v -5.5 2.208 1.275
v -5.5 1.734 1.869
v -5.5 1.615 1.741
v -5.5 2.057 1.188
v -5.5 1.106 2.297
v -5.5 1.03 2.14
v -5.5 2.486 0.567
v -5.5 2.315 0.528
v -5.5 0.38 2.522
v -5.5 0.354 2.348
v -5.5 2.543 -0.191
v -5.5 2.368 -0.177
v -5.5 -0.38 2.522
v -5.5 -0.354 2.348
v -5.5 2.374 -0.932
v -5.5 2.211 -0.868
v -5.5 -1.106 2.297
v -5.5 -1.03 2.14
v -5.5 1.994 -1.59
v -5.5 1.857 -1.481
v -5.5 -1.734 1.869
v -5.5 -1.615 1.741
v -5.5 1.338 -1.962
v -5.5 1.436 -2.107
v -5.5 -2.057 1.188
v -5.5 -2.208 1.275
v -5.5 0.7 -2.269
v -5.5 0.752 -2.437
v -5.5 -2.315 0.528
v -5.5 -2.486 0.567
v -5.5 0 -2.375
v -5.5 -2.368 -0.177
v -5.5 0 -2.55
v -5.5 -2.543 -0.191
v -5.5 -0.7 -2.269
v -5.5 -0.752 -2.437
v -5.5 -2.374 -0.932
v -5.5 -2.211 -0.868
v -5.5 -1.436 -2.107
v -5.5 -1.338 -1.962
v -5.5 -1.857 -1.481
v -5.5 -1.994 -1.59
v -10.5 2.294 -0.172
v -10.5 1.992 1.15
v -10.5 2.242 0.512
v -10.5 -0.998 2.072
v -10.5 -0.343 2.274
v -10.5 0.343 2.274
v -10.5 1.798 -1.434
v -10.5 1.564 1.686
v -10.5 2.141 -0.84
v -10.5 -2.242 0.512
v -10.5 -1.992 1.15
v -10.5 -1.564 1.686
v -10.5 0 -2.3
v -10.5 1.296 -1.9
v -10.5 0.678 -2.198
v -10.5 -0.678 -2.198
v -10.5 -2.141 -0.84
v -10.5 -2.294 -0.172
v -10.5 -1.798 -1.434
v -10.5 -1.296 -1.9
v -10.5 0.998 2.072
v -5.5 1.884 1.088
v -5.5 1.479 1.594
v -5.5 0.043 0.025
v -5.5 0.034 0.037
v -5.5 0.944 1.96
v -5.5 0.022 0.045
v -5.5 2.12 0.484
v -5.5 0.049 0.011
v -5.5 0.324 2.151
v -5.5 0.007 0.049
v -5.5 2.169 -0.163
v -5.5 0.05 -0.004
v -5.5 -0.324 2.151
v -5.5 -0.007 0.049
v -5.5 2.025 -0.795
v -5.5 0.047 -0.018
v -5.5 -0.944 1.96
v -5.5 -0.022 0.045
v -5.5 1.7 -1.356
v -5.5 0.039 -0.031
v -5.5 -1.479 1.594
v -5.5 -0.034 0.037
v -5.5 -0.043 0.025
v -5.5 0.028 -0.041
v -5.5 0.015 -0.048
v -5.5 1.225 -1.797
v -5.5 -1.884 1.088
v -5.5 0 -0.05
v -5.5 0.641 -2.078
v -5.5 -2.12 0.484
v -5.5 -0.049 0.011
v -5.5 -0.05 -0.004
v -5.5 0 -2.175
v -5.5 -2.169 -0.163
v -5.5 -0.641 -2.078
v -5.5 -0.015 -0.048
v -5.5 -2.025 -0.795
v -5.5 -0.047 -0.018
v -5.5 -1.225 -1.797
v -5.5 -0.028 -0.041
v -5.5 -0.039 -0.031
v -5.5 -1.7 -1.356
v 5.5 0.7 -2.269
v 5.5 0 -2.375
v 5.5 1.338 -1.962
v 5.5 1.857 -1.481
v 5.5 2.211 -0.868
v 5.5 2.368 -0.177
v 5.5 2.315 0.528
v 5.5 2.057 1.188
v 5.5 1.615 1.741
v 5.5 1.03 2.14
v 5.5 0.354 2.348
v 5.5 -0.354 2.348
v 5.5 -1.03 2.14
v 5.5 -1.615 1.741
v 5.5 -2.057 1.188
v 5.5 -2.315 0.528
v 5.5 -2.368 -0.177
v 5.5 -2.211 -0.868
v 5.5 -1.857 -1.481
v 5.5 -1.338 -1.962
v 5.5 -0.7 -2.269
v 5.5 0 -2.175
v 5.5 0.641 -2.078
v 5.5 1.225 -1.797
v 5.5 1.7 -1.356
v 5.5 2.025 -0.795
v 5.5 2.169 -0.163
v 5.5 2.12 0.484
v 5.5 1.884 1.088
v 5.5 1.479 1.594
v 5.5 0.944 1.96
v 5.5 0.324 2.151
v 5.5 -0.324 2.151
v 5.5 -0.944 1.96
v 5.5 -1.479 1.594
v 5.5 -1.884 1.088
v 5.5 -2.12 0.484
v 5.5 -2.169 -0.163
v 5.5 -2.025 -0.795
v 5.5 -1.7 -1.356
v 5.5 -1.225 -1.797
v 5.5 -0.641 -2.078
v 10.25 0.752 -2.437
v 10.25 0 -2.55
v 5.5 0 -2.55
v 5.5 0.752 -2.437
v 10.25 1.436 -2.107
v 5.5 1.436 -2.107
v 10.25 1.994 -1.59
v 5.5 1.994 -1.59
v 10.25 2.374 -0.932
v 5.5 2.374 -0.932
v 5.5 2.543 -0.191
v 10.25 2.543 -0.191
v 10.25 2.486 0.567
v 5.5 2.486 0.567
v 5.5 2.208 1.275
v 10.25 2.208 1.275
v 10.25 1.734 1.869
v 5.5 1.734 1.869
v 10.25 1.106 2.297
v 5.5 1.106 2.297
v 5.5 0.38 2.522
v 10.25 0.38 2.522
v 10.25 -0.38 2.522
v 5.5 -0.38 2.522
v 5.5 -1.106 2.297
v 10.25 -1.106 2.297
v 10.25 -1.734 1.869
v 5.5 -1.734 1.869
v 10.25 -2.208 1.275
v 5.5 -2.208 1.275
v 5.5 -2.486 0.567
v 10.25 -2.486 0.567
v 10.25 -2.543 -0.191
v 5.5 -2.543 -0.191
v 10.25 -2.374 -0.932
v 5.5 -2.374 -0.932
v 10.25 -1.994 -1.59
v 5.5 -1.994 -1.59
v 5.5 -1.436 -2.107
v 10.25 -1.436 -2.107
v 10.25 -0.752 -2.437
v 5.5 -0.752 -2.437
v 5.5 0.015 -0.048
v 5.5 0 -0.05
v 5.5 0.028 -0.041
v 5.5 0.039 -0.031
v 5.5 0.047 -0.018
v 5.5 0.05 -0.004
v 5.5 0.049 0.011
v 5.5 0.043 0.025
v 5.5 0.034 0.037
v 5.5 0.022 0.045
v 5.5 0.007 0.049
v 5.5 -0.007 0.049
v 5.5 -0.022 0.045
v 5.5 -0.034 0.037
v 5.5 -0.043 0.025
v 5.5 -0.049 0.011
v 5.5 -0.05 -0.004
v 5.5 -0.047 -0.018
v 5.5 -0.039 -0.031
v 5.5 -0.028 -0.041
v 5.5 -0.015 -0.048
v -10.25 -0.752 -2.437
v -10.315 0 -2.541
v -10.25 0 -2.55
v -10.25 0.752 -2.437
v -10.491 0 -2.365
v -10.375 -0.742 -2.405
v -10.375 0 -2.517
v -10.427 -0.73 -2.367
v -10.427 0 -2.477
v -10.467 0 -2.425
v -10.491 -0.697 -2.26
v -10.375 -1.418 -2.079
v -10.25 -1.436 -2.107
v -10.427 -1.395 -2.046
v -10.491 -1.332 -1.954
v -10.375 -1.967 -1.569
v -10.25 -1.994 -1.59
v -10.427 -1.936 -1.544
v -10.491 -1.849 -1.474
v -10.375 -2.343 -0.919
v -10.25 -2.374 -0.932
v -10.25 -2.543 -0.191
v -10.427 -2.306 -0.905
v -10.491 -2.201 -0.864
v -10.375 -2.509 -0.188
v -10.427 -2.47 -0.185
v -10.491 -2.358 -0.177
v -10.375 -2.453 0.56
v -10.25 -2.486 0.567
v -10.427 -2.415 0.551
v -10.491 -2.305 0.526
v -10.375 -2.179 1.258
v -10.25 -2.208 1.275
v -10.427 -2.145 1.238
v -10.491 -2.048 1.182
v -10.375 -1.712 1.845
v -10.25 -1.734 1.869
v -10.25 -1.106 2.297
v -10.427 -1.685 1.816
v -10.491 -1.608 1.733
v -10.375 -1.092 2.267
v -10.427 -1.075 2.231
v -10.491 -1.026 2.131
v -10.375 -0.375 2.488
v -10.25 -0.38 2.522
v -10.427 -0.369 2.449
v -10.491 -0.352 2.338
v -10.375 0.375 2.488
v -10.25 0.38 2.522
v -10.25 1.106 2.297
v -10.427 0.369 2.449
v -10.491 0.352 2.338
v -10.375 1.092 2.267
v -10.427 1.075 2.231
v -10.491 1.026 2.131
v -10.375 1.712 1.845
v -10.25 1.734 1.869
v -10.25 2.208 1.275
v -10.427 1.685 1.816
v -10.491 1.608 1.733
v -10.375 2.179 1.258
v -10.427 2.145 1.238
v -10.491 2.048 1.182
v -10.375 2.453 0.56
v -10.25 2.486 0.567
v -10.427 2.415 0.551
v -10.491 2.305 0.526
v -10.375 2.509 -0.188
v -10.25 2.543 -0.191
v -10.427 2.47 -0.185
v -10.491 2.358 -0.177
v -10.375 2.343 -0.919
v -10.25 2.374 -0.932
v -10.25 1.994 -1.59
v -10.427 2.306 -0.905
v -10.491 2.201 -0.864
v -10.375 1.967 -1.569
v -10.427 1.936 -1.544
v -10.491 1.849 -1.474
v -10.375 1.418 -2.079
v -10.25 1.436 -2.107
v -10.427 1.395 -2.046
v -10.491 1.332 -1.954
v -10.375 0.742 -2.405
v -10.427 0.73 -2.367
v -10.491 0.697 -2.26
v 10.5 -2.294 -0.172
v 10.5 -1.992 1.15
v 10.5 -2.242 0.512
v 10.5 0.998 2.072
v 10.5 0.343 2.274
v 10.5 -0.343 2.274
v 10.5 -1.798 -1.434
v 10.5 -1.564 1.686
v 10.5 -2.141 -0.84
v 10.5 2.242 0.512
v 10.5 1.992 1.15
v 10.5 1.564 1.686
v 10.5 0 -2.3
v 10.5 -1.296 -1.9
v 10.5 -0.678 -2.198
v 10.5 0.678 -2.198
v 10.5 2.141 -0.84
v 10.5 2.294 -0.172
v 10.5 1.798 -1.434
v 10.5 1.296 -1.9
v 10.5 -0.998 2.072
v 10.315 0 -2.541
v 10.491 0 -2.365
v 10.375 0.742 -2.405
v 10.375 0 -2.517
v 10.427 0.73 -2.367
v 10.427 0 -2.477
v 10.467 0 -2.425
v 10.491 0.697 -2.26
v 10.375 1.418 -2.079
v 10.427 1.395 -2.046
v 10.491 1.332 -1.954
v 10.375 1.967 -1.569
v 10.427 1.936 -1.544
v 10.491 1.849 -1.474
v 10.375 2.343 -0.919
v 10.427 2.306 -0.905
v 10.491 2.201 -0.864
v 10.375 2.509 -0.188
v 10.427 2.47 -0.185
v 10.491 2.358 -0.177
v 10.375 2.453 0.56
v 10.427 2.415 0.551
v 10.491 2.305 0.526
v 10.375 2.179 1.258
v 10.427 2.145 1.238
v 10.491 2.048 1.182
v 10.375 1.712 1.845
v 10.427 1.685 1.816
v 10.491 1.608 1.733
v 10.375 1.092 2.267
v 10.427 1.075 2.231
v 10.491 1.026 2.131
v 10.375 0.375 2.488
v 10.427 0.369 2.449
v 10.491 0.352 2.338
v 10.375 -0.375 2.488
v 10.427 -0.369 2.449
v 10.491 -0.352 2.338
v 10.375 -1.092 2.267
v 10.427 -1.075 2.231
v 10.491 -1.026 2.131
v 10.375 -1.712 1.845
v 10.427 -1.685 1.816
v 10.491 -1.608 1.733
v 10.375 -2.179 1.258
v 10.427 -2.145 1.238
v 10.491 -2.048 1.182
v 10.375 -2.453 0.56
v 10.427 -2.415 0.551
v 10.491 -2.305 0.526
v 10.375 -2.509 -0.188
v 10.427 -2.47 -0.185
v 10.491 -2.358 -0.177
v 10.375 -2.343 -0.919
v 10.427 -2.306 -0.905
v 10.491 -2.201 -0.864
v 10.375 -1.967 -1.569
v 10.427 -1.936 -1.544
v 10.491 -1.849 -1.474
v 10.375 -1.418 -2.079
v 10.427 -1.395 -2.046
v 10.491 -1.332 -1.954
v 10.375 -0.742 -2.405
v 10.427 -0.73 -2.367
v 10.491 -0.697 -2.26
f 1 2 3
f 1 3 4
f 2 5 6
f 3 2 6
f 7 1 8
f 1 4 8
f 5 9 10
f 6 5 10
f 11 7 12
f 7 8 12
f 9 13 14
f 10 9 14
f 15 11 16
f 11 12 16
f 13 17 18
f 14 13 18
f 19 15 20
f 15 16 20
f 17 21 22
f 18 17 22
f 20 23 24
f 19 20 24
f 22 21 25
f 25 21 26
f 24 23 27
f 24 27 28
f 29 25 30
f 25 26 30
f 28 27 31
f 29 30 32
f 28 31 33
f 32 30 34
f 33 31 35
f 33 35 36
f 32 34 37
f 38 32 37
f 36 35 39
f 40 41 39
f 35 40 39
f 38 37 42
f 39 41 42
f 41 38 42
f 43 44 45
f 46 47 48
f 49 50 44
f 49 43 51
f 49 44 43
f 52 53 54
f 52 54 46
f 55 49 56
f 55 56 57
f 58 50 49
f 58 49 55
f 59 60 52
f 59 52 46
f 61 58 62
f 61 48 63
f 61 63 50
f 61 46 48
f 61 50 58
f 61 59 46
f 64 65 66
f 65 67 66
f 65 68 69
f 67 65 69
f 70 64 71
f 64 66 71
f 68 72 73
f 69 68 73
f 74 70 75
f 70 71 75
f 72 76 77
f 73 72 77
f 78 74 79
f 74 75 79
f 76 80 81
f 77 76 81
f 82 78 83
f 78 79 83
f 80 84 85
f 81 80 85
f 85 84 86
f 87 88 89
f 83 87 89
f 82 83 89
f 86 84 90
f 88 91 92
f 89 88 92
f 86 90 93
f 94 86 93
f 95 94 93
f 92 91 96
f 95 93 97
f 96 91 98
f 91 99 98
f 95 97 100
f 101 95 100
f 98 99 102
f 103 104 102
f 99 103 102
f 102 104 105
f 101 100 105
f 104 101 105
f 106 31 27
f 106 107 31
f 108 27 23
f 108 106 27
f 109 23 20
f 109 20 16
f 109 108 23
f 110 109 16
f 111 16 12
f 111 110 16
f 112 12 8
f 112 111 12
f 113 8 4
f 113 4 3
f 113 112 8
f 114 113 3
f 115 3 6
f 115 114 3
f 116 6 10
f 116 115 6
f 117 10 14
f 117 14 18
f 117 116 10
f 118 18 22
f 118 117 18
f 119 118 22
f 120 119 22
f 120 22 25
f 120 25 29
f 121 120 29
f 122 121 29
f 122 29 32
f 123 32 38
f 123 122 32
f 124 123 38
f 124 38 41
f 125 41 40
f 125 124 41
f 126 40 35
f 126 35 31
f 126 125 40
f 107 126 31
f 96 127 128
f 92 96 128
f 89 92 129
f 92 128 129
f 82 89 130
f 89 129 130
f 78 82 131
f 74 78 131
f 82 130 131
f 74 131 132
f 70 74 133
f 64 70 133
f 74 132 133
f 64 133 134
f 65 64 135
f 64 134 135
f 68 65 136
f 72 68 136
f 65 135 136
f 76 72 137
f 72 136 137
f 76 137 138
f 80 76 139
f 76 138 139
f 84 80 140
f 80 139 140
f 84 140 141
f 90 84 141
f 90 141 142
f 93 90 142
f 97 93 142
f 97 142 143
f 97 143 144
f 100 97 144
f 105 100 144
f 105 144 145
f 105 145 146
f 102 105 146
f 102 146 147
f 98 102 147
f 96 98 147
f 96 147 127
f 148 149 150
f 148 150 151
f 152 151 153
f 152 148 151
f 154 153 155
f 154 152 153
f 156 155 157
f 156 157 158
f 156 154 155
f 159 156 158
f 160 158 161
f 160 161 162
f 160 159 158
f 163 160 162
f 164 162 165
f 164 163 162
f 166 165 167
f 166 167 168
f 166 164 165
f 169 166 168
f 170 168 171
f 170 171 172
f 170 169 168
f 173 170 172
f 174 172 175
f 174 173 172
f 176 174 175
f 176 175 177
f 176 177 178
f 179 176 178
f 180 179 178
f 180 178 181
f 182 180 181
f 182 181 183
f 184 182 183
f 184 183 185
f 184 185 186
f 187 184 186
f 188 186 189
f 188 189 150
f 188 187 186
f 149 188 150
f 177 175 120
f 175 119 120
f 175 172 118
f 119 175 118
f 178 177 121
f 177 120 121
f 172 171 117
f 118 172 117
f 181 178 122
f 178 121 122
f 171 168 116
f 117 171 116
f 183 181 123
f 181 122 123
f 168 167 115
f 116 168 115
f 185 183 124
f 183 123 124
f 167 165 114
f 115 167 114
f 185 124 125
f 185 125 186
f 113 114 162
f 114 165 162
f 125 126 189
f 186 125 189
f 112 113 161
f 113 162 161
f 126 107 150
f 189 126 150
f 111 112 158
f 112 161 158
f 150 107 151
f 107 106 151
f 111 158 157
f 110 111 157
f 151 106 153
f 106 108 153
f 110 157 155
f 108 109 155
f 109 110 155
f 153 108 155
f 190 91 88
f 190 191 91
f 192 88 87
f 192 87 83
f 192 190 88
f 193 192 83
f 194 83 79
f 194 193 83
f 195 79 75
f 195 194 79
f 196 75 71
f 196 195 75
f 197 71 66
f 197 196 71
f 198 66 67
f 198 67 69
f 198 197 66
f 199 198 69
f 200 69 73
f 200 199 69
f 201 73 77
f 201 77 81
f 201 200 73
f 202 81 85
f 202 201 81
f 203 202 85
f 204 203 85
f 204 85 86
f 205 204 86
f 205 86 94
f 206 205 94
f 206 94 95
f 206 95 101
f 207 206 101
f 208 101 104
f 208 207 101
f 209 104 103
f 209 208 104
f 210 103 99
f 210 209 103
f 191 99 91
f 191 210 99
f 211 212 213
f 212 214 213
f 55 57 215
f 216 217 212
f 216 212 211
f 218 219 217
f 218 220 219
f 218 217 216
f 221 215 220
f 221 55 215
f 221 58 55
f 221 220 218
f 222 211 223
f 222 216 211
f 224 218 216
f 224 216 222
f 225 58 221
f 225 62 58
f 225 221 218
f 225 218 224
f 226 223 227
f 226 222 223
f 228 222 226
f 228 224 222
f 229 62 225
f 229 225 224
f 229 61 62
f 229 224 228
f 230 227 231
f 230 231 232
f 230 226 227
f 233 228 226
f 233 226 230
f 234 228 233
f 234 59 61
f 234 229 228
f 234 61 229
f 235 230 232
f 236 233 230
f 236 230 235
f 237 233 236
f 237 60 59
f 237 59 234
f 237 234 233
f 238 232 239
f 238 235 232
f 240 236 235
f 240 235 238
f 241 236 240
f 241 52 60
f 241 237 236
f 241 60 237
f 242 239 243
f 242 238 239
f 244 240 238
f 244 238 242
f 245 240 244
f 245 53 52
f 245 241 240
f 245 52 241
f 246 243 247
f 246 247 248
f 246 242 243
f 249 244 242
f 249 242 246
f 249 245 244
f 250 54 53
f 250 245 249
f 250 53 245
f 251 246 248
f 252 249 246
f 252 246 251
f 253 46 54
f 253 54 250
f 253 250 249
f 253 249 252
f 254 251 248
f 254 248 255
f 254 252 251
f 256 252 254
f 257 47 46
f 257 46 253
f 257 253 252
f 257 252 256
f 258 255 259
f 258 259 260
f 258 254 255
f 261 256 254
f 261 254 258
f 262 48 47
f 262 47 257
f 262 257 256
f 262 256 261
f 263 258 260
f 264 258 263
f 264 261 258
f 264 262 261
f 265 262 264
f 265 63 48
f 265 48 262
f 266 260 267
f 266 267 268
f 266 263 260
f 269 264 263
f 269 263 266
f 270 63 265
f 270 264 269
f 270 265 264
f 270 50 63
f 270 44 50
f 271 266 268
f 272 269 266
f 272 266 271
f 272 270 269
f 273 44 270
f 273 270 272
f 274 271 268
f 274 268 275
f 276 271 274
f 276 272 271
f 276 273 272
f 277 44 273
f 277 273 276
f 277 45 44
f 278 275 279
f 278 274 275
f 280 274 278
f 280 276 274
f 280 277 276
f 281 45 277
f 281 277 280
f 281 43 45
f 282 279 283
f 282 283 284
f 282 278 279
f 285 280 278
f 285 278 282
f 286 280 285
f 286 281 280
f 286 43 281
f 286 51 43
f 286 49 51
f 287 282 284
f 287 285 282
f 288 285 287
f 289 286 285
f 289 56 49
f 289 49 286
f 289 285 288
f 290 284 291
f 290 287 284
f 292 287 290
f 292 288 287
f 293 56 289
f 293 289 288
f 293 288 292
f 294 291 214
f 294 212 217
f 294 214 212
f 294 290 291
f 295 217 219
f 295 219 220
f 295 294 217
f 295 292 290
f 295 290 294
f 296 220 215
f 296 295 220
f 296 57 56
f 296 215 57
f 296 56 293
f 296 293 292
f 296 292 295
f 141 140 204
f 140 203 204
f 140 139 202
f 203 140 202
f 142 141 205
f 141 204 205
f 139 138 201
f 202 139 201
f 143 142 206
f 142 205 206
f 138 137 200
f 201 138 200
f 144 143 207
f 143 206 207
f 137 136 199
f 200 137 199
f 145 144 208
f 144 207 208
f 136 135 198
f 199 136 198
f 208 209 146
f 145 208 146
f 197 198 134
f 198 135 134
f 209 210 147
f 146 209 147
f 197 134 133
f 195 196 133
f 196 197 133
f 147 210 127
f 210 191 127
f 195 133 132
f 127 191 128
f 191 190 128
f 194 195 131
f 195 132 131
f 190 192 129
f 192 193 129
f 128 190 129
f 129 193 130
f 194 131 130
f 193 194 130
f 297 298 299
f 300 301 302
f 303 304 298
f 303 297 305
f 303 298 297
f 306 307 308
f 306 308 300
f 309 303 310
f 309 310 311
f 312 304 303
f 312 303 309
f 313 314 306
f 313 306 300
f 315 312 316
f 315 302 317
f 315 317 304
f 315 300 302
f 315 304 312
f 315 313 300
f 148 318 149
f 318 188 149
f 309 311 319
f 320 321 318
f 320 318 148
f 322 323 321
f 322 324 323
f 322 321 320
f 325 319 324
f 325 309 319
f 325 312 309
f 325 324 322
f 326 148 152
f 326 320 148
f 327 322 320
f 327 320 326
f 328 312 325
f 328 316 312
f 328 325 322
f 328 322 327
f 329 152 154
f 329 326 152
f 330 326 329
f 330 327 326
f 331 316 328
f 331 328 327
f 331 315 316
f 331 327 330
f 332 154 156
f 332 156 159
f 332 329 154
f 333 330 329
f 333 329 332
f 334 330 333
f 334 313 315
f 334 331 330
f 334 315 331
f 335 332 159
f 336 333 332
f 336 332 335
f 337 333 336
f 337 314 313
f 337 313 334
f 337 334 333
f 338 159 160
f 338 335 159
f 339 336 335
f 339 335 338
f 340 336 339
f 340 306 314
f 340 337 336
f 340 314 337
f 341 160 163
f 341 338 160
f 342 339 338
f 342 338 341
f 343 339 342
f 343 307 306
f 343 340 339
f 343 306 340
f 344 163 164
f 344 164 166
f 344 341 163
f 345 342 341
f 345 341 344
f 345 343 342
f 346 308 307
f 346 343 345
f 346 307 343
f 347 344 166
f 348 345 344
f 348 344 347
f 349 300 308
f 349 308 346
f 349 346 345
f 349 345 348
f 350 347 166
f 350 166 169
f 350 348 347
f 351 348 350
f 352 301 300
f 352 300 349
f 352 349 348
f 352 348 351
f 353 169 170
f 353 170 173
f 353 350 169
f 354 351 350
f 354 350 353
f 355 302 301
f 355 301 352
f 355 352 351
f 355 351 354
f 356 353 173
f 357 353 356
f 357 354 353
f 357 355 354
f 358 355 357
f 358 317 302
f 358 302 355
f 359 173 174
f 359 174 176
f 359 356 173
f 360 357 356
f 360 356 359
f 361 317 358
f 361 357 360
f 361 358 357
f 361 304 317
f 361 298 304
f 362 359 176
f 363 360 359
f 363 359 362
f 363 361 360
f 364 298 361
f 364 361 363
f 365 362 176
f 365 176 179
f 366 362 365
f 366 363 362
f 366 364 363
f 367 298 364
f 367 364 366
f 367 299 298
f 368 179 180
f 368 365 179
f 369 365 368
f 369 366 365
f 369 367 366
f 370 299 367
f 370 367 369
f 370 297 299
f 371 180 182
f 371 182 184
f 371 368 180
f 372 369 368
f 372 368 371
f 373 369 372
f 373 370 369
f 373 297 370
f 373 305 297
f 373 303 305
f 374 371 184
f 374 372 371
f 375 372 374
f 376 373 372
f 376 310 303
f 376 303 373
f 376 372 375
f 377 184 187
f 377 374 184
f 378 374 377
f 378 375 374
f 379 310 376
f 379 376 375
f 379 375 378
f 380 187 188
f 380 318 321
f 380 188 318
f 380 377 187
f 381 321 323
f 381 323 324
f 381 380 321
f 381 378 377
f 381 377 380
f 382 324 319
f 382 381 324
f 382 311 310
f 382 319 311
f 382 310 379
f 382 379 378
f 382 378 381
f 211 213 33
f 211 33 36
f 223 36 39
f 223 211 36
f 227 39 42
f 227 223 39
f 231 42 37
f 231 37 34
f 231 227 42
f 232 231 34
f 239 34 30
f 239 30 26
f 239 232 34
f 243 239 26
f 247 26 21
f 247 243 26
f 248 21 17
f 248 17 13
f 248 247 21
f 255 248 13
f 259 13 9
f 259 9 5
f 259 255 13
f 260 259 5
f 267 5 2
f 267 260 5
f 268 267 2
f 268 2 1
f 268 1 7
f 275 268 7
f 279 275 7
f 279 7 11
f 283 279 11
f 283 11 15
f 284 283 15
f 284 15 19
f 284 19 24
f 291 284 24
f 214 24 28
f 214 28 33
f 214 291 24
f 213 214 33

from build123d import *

# Parameters (mm, degrees)
SKETCH1_R           = 2.375
EXTRUDE1_DEPTH      = 10
SHELL1_T            = -0.2
SKETCH2_R           = 0.05
EXTRUDE2_DEPTH      = 9.65
EXTRUDE2_DEPTH_BACK = 9.65
SKETCH7_R           = 2.55
EXTRUDE6_DEPTH      = 5
FILLET2_R           = 0.25
SKETCH8_R           = 2.55
EXTRUDE7_DEPTH      = 5
FILLET3_R           = 0.25


with BuildPart() as part:
    # Sketch1 → Extrude1 (new, symmetric)
    with BuildSketch(Plane(origin=(0, 0, 0), x_dir=(0, 0, -1), z_dir=(1, 0, 0))):
        Circle(SKETCH1_R)
    extrude(amount=EXTRUDE1_DEPTH, both=True)

    # Shell1
    shell1_openings = [part.faces().sort_by_distance(p)[0] for p in [
        (10, 0, 0),
        (-10, 0, 0),
    ]]
    offset(amount=SHELL1_T, openings=shell1_openings, kind=Kind.INTERSECTION)



with BuildPart() as body_2:
    # Sketch2 → Extrude2 (new, two sides)
    with BuildSketch(Plane(origin=(0, 0, 0), x_dir=(0, 0, -1), z_dir=(1, 0, 0))) as extrude2_sk:
        Circle(SKETCH2_R)
    extrude(amount=EXTRUDE2_DEPTH)
    extrude(extrude2_sk.sketch, amount=-EXTRUDE2_DEPTH_BACK)


with BuildPart() as part_1:
    add(part.part)

    add(body_2.part)  # Extrude6 merges body 2
    # Sketch7 → Extrude6 (add)
    with BuildSketch(Plane(origin=(10.5, 0, 0), x_dir=(0, 0, -1), z_dir=(1, 0, 0))):
        Circle(SKETCH7_R)
    extrude(amount=-EXTRUDE6_DEPTH)

    # Fillet2
    fillet2_edges = [part_1.edges().sort_by_distance(p)[0] for p in [
        (10.5, 0, 2.55),
    ]]
    fillet(fillet2_edges, radius=FILLET2_R)

    # Sketch8 → Extrude7 (add)
    with BuildSketch(Plane.ZY.offset(10.5)):
        with Locations(Location((0, 0, 0), (0, 0, 180))):
            Circle(SKETCH8_R)
    extrude(amount=-EXTRUDE7_DEPTH)

    # Fillet3
    fillet3_edges = [part_1.edges().sort_by_distance(p)[0] for p in [
        (-10.5, 0, 2.55),
    ]]
    fillet(fillet3_edges, radius=FILLET3_R)


solid = part_1.part
